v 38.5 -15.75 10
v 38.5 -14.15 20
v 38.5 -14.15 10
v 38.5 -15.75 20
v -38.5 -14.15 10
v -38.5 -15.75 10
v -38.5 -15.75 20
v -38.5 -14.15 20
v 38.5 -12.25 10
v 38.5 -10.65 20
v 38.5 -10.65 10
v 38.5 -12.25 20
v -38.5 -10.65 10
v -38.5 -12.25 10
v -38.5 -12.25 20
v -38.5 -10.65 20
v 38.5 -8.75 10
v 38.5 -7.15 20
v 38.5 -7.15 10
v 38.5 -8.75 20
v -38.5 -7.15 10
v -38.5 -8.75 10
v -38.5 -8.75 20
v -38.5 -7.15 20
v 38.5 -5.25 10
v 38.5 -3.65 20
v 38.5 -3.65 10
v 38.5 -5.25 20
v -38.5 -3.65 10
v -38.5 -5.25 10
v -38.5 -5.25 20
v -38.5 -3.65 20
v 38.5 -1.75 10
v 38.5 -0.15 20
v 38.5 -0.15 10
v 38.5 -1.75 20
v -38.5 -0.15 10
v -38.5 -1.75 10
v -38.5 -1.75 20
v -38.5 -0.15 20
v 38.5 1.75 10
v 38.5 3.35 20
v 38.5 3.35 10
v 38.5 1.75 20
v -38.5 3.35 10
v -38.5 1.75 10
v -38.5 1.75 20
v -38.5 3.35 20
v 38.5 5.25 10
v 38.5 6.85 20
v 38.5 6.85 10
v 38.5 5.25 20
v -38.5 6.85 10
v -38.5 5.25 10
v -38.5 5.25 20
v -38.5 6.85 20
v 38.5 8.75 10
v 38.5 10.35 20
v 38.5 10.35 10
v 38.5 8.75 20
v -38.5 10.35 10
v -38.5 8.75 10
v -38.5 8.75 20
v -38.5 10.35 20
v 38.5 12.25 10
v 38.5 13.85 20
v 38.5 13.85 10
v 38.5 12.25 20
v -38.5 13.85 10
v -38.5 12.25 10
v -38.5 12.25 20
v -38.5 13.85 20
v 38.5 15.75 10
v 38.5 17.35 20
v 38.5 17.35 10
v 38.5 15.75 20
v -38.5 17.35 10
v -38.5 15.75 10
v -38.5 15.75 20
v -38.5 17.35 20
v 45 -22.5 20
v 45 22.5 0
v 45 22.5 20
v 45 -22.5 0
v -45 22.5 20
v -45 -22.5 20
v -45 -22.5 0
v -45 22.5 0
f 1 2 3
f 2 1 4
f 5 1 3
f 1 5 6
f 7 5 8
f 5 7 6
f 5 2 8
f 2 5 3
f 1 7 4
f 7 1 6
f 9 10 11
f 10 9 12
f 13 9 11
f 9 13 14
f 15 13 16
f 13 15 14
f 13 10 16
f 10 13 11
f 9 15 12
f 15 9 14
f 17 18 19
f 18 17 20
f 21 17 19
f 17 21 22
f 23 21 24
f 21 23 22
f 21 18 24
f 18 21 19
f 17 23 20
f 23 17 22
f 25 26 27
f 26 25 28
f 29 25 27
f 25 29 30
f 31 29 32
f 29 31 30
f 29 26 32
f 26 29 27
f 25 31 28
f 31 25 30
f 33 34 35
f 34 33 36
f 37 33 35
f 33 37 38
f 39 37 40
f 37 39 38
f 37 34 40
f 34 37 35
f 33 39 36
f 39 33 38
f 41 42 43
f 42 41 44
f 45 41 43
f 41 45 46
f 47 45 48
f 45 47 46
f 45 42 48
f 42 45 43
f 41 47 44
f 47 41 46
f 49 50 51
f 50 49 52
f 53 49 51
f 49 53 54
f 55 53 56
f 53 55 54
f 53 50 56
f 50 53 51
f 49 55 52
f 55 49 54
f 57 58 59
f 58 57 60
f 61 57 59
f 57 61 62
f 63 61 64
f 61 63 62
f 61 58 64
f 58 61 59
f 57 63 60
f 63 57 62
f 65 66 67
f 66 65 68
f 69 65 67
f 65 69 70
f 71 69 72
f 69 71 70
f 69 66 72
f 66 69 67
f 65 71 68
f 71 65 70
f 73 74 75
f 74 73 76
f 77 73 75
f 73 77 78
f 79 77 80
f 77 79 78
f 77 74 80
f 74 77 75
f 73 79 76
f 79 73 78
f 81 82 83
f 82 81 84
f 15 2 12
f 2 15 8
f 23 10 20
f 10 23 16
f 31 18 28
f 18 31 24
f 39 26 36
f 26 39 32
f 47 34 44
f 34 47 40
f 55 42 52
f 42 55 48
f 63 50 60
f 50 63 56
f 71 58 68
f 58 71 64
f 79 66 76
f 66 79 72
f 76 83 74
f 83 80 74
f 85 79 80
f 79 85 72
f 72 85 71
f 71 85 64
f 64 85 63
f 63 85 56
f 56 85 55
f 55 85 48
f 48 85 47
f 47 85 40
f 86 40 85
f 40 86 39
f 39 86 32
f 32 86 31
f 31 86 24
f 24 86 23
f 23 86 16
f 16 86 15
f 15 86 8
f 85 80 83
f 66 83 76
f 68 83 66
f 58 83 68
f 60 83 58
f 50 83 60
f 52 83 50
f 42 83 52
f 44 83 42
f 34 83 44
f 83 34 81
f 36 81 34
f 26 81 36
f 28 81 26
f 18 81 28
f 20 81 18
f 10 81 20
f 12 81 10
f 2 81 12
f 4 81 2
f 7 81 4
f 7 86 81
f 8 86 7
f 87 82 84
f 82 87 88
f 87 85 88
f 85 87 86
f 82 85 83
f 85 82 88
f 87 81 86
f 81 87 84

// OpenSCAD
// Microscope slide drying rack
// Print orientation: base block on XY plane, slots open upward (+Z)

// ---------------- Parameters ----------------
block_len    = 90;    // block length along X (mm)
block_wid    = 45;    // block width along Y (mm)
block_ht     = 20;    // block height along Z (mm)

slot_len     = 77;    // slot length along X (mm)
slot_w       = 1.6;   // slot width along Y (mm)
slot_depth   = 10;    // slot depth from top face (mm)
slot_pitch   = 3.5;   // centre-to-centre spacing of slots in Y (mm)
slot_count   = 10;    // number of slots

eps          = 0.5;   // overshoot so cutters pass through the top face (mm)

$fn = 64;

// ---------------- Model ----------------
difference() {
    // Base block, centred in X and Y, sitting on z = 0
    translate([-block_len/2, -block_wid/2, 0])
        cube([block_len, block_wid, block_ht]);

    // Row of parallel slots, centred on the block in X and Y
    for (i = [0 : slot_count - 1]) {
        y = (i - (slot_count - 1)/2) * slot_pitch;
        translate([-slot_len/2, y, block_ht - slot_depth])
            cube([slot_len, slot_w, slot_depth + eps]);
    }
}
